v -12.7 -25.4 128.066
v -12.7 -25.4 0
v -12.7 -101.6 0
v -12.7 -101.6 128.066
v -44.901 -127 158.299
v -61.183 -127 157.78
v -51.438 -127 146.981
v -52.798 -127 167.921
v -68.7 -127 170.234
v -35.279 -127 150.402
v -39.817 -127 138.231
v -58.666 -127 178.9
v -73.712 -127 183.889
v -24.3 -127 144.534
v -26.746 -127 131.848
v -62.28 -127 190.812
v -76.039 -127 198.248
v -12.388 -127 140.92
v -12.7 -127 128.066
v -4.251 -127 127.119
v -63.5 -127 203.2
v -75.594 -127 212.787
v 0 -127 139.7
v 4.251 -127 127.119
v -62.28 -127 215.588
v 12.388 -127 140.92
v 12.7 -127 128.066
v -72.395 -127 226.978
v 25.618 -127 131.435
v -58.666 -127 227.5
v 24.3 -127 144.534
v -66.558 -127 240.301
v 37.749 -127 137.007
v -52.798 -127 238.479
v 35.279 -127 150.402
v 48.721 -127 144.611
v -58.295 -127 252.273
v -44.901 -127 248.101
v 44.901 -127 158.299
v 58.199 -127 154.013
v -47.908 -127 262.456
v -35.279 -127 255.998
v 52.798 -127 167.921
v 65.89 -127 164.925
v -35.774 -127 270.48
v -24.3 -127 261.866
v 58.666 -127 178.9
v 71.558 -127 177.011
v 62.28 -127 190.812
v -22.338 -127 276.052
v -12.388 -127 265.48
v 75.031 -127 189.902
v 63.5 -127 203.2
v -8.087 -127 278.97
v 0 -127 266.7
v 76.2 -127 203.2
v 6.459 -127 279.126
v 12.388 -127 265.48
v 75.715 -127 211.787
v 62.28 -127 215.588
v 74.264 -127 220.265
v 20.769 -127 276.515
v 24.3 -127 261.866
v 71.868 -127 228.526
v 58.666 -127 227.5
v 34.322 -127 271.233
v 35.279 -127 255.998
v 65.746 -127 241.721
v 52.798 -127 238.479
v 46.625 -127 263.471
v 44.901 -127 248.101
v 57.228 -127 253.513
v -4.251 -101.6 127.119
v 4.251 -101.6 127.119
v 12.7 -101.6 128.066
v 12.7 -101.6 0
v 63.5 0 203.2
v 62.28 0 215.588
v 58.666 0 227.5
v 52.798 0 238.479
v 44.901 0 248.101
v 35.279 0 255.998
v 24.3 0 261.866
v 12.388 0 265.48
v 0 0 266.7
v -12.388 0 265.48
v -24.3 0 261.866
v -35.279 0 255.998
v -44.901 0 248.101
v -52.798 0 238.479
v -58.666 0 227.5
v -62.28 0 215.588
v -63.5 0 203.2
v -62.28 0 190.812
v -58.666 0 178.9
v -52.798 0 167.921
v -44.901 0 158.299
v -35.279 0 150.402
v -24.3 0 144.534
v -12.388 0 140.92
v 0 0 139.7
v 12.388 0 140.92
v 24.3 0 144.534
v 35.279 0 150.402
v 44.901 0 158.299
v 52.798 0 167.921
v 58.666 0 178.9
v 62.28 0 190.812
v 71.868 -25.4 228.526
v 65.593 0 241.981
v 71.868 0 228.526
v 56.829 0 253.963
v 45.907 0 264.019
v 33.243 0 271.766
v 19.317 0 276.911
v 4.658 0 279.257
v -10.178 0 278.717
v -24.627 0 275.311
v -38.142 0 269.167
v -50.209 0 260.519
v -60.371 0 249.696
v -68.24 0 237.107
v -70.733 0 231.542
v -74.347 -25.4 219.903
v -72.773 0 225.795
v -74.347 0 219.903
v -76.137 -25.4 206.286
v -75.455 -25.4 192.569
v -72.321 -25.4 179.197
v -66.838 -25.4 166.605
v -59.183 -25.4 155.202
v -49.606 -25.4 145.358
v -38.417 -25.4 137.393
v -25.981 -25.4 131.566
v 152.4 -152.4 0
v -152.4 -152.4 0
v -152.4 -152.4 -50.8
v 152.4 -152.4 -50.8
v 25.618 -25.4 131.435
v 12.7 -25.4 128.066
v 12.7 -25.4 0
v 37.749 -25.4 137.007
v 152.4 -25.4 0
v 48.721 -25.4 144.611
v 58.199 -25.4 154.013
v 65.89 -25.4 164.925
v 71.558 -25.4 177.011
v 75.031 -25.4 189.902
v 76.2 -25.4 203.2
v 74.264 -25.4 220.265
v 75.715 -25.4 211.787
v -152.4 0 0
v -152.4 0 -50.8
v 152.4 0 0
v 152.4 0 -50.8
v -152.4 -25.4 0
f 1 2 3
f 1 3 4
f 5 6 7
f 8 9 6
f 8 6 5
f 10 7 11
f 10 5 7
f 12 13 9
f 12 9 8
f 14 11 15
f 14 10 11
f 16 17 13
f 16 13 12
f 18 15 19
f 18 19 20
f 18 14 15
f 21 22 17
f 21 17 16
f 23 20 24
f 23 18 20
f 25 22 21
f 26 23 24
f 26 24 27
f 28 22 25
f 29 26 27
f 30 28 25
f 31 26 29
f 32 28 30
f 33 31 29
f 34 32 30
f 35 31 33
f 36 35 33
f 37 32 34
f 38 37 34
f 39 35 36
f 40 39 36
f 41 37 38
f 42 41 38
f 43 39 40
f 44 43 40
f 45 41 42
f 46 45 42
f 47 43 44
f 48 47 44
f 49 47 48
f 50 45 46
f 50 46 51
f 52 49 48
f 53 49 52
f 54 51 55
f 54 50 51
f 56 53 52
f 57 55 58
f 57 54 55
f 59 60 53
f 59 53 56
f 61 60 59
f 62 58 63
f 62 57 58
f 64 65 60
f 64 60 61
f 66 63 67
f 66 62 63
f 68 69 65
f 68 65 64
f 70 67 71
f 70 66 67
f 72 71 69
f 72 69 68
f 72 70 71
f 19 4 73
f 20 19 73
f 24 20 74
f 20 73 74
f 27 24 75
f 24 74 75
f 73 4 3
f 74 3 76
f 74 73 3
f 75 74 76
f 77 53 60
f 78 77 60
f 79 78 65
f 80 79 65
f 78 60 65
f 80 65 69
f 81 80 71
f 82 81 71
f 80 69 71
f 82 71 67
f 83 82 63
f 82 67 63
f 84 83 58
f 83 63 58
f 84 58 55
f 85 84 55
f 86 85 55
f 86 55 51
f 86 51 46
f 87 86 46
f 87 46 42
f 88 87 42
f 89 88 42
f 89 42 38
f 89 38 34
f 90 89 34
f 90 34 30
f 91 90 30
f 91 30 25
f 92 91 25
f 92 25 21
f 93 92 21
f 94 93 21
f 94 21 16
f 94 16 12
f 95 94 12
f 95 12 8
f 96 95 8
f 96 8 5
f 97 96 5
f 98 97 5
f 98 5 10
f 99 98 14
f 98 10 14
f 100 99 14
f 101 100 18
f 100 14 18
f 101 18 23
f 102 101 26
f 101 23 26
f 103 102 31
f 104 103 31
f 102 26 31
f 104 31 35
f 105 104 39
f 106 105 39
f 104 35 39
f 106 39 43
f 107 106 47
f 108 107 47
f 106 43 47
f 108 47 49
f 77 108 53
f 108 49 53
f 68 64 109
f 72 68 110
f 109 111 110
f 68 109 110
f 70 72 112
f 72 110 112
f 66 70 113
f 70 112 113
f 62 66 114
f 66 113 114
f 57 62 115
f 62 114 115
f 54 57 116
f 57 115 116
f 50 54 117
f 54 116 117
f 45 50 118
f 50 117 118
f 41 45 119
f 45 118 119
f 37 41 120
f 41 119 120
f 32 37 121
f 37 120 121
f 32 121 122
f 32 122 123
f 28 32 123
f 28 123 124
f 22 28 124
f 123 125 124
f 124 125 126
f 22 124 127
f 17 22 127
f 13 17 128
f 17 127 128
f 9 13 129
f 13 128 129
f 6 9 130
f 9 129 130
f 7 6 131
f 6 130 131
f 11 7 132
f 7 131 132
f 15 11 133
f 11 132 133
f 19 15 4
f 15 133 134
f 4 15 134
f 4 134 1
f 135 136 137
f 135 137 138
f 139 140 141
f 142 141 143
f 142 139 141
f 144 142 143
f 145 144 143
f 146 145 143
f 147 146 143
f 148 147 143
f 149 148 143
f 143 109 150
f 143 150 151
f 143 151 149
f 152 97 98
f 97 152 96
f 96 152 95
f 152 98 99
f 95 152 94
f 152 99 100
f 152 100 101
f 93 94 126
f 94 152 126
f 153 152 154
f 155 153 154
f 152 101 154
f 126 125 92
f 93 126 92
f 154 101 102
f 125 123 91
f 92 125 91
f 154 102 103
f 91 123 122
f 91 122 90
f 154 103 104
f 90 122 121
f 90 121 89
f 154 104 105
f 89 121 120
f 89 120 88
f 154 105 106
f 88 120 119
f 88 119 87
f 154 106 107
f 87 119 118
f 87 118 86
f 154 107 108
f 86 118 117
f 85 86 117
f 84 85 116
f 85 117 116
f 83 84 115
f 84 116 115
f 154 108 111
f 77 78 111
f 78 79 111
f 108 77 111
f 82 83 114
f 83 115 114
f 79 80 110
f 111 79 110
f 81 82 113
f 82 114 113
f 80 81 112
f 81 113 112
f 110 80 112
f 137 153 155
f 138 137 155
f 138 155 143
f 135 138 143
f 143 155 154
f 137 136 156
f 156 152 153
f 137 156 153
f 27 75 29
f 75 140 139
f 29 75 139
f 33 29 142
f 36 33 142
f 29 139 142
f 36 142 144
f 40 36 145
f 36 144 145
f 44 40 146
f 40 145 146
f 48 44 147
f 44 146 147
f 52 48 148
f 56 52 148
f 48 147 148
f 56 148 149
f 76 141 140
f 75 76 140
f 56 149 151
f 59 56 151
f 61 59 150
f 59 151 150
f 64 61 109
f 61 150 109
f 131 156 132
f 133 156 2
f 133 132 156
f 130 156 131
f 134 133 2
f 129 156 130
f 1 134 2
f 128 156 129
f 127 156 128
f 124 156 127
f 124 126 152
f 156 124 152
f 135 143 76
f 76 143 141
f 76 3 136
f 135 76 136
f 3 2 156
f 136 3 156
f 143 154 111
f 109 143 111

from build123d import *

# Parameters (mm, degrees)
F1_DEPTH = 152.4
F2_DEPTH = 25.4
F4_DEPTH = 101.6
F5_W     = 25.4
F5_H     = 129.54
F6_DEPTH = 101.6
F7_R     = 63.5
F8_DEPTH = 127.001


with BuildPart() as f1:
    # F0 (on Front) → F1 (new body)
    with BuildSketch(Plane.XZ):
        Polygon((-152.4, 0), (-152.4, -50.8), (152.4, -50.8), (152.4, 0), (12.7, 0), (-12.7, 0), align=None)
    extrude(amount=F1_DEPTH)

    # F0 (on Front) → F2 (join)
    with BuildSketch(Plane.XZ):
        Polygon((-152.4, 0), (-152.4, -50.8), (152.4, -50.8), (152.4, 0), (12.7, 0), (-12.7, 0), align=None)
        with BuildLine():
            Line((-74.3468107782, 219.9030454442), (-152.4, 0))
            Line((-152.4, 0), (-12.7, 0))
            Line((-12.7, 0), (-12.7, 128.0657867546))
            ThreePointArc((-12.7, 128.0657867546), (-63.2677432628, 160.7308033696), (-74.3468107782, 219.9030454442))
        make_face()
        with BuildLine():
            Line((12.7, 0), (152.4, 0))
            Line((152.4, 0), (71.8681340167, 228.5260994423))
            ThreePointArc((71.8681340167, 228.5260994423), (75.109226504, 216.0469488193), (76.2, 203.2))
            ThreePointArc((76.2, 203.2), (58.1987113259, 154.0131115032), (12.7, 128.0657867546))
            Line((12.7, 128.0657867546), (12.7, 0))
        make_face()
        with BuildLine():
            Line((-68.2402594432, 237.1073294603), (-74.3468107782, 219.9030454442))
            ThreePointArc((-74.3468107782, 219.9030454442), (-63.2677432628, 160.7308033696), (-12.7, 128.0657867546))
            ThreePointArc((-12.7, 128.0657867546), (0, 127), (12.7, 128.0657867546))
            ThreePointArc((12.7, 128.0657867546), (58.1987113259, 154.0131115032), (76.2, 203.2))
            ThreePointArc((76.2, 203.2), (75.109226504, 216.0469488193), (71.8681340167, 228.5260994423))
            ThreePointArc((71.8681340167, 228.5260994423), (4.6582985773, 279.257479937), (-68.2402594432, 237.1073294603))
        make_face()
        with BuildLine():
            ThreePointArc((-68.2402594432, 237.1073294603), (-71.810618962, 228.6887230809), (-74.3468107782, 219.9030454442))
            Line((-74.3468107782, 219.9030454442), (-68.2402594432, 237.1073294603))
        make_face()
    extrude(amount=F2_DEPTH)

    # F3 (on face) → F4 (join)
    with BuildSketch(Plane.XZ.offset(25.4)):
        with BuildLine():
            ThreePointArc((12.7, 128.0657867546), (58.1987113259, 154.0131115032), (76.2, 203.2))
            ThreePointArc((76.2, 203.2), (75.109226504, 216.0469488193), (71.8681340167, 228.5260994423))
            ThreePointArc((71.8681340167, 228.5260994423), (-4.4861146536, 279.2678300947), (-74.3468107782, 219.9030454442))
            ThreePointArc((-74.3468107782, 219.9030454442), (-63.2677432628, 160.7308033696), (-12.7, 128.0657867546))
            ThreePointArc((-12.7, 128.0657867546), (0, 127), (12.7, 128.0657867546))
        make_face()
    extrude(amount=F4_DEPTH)

    # F5 (on Front) → F6 (join)
    with BuildSketch(Plane.XZ):
        with Locations((0, 64.77)):
            Rectangle(F5_W, F5_H)
    extrude(amount=F6_DEPTH)

    # F7 (on face) → F8 (cut, through all)
    with BuildSketch(Plane.XZ.offset(127)):
        with Locations((0, 203.2)):
            Circle(F7_R)
    extrude(amount=-F8_DEPTH, mode=Mode.SUBTRACT)


solid = f1.part
